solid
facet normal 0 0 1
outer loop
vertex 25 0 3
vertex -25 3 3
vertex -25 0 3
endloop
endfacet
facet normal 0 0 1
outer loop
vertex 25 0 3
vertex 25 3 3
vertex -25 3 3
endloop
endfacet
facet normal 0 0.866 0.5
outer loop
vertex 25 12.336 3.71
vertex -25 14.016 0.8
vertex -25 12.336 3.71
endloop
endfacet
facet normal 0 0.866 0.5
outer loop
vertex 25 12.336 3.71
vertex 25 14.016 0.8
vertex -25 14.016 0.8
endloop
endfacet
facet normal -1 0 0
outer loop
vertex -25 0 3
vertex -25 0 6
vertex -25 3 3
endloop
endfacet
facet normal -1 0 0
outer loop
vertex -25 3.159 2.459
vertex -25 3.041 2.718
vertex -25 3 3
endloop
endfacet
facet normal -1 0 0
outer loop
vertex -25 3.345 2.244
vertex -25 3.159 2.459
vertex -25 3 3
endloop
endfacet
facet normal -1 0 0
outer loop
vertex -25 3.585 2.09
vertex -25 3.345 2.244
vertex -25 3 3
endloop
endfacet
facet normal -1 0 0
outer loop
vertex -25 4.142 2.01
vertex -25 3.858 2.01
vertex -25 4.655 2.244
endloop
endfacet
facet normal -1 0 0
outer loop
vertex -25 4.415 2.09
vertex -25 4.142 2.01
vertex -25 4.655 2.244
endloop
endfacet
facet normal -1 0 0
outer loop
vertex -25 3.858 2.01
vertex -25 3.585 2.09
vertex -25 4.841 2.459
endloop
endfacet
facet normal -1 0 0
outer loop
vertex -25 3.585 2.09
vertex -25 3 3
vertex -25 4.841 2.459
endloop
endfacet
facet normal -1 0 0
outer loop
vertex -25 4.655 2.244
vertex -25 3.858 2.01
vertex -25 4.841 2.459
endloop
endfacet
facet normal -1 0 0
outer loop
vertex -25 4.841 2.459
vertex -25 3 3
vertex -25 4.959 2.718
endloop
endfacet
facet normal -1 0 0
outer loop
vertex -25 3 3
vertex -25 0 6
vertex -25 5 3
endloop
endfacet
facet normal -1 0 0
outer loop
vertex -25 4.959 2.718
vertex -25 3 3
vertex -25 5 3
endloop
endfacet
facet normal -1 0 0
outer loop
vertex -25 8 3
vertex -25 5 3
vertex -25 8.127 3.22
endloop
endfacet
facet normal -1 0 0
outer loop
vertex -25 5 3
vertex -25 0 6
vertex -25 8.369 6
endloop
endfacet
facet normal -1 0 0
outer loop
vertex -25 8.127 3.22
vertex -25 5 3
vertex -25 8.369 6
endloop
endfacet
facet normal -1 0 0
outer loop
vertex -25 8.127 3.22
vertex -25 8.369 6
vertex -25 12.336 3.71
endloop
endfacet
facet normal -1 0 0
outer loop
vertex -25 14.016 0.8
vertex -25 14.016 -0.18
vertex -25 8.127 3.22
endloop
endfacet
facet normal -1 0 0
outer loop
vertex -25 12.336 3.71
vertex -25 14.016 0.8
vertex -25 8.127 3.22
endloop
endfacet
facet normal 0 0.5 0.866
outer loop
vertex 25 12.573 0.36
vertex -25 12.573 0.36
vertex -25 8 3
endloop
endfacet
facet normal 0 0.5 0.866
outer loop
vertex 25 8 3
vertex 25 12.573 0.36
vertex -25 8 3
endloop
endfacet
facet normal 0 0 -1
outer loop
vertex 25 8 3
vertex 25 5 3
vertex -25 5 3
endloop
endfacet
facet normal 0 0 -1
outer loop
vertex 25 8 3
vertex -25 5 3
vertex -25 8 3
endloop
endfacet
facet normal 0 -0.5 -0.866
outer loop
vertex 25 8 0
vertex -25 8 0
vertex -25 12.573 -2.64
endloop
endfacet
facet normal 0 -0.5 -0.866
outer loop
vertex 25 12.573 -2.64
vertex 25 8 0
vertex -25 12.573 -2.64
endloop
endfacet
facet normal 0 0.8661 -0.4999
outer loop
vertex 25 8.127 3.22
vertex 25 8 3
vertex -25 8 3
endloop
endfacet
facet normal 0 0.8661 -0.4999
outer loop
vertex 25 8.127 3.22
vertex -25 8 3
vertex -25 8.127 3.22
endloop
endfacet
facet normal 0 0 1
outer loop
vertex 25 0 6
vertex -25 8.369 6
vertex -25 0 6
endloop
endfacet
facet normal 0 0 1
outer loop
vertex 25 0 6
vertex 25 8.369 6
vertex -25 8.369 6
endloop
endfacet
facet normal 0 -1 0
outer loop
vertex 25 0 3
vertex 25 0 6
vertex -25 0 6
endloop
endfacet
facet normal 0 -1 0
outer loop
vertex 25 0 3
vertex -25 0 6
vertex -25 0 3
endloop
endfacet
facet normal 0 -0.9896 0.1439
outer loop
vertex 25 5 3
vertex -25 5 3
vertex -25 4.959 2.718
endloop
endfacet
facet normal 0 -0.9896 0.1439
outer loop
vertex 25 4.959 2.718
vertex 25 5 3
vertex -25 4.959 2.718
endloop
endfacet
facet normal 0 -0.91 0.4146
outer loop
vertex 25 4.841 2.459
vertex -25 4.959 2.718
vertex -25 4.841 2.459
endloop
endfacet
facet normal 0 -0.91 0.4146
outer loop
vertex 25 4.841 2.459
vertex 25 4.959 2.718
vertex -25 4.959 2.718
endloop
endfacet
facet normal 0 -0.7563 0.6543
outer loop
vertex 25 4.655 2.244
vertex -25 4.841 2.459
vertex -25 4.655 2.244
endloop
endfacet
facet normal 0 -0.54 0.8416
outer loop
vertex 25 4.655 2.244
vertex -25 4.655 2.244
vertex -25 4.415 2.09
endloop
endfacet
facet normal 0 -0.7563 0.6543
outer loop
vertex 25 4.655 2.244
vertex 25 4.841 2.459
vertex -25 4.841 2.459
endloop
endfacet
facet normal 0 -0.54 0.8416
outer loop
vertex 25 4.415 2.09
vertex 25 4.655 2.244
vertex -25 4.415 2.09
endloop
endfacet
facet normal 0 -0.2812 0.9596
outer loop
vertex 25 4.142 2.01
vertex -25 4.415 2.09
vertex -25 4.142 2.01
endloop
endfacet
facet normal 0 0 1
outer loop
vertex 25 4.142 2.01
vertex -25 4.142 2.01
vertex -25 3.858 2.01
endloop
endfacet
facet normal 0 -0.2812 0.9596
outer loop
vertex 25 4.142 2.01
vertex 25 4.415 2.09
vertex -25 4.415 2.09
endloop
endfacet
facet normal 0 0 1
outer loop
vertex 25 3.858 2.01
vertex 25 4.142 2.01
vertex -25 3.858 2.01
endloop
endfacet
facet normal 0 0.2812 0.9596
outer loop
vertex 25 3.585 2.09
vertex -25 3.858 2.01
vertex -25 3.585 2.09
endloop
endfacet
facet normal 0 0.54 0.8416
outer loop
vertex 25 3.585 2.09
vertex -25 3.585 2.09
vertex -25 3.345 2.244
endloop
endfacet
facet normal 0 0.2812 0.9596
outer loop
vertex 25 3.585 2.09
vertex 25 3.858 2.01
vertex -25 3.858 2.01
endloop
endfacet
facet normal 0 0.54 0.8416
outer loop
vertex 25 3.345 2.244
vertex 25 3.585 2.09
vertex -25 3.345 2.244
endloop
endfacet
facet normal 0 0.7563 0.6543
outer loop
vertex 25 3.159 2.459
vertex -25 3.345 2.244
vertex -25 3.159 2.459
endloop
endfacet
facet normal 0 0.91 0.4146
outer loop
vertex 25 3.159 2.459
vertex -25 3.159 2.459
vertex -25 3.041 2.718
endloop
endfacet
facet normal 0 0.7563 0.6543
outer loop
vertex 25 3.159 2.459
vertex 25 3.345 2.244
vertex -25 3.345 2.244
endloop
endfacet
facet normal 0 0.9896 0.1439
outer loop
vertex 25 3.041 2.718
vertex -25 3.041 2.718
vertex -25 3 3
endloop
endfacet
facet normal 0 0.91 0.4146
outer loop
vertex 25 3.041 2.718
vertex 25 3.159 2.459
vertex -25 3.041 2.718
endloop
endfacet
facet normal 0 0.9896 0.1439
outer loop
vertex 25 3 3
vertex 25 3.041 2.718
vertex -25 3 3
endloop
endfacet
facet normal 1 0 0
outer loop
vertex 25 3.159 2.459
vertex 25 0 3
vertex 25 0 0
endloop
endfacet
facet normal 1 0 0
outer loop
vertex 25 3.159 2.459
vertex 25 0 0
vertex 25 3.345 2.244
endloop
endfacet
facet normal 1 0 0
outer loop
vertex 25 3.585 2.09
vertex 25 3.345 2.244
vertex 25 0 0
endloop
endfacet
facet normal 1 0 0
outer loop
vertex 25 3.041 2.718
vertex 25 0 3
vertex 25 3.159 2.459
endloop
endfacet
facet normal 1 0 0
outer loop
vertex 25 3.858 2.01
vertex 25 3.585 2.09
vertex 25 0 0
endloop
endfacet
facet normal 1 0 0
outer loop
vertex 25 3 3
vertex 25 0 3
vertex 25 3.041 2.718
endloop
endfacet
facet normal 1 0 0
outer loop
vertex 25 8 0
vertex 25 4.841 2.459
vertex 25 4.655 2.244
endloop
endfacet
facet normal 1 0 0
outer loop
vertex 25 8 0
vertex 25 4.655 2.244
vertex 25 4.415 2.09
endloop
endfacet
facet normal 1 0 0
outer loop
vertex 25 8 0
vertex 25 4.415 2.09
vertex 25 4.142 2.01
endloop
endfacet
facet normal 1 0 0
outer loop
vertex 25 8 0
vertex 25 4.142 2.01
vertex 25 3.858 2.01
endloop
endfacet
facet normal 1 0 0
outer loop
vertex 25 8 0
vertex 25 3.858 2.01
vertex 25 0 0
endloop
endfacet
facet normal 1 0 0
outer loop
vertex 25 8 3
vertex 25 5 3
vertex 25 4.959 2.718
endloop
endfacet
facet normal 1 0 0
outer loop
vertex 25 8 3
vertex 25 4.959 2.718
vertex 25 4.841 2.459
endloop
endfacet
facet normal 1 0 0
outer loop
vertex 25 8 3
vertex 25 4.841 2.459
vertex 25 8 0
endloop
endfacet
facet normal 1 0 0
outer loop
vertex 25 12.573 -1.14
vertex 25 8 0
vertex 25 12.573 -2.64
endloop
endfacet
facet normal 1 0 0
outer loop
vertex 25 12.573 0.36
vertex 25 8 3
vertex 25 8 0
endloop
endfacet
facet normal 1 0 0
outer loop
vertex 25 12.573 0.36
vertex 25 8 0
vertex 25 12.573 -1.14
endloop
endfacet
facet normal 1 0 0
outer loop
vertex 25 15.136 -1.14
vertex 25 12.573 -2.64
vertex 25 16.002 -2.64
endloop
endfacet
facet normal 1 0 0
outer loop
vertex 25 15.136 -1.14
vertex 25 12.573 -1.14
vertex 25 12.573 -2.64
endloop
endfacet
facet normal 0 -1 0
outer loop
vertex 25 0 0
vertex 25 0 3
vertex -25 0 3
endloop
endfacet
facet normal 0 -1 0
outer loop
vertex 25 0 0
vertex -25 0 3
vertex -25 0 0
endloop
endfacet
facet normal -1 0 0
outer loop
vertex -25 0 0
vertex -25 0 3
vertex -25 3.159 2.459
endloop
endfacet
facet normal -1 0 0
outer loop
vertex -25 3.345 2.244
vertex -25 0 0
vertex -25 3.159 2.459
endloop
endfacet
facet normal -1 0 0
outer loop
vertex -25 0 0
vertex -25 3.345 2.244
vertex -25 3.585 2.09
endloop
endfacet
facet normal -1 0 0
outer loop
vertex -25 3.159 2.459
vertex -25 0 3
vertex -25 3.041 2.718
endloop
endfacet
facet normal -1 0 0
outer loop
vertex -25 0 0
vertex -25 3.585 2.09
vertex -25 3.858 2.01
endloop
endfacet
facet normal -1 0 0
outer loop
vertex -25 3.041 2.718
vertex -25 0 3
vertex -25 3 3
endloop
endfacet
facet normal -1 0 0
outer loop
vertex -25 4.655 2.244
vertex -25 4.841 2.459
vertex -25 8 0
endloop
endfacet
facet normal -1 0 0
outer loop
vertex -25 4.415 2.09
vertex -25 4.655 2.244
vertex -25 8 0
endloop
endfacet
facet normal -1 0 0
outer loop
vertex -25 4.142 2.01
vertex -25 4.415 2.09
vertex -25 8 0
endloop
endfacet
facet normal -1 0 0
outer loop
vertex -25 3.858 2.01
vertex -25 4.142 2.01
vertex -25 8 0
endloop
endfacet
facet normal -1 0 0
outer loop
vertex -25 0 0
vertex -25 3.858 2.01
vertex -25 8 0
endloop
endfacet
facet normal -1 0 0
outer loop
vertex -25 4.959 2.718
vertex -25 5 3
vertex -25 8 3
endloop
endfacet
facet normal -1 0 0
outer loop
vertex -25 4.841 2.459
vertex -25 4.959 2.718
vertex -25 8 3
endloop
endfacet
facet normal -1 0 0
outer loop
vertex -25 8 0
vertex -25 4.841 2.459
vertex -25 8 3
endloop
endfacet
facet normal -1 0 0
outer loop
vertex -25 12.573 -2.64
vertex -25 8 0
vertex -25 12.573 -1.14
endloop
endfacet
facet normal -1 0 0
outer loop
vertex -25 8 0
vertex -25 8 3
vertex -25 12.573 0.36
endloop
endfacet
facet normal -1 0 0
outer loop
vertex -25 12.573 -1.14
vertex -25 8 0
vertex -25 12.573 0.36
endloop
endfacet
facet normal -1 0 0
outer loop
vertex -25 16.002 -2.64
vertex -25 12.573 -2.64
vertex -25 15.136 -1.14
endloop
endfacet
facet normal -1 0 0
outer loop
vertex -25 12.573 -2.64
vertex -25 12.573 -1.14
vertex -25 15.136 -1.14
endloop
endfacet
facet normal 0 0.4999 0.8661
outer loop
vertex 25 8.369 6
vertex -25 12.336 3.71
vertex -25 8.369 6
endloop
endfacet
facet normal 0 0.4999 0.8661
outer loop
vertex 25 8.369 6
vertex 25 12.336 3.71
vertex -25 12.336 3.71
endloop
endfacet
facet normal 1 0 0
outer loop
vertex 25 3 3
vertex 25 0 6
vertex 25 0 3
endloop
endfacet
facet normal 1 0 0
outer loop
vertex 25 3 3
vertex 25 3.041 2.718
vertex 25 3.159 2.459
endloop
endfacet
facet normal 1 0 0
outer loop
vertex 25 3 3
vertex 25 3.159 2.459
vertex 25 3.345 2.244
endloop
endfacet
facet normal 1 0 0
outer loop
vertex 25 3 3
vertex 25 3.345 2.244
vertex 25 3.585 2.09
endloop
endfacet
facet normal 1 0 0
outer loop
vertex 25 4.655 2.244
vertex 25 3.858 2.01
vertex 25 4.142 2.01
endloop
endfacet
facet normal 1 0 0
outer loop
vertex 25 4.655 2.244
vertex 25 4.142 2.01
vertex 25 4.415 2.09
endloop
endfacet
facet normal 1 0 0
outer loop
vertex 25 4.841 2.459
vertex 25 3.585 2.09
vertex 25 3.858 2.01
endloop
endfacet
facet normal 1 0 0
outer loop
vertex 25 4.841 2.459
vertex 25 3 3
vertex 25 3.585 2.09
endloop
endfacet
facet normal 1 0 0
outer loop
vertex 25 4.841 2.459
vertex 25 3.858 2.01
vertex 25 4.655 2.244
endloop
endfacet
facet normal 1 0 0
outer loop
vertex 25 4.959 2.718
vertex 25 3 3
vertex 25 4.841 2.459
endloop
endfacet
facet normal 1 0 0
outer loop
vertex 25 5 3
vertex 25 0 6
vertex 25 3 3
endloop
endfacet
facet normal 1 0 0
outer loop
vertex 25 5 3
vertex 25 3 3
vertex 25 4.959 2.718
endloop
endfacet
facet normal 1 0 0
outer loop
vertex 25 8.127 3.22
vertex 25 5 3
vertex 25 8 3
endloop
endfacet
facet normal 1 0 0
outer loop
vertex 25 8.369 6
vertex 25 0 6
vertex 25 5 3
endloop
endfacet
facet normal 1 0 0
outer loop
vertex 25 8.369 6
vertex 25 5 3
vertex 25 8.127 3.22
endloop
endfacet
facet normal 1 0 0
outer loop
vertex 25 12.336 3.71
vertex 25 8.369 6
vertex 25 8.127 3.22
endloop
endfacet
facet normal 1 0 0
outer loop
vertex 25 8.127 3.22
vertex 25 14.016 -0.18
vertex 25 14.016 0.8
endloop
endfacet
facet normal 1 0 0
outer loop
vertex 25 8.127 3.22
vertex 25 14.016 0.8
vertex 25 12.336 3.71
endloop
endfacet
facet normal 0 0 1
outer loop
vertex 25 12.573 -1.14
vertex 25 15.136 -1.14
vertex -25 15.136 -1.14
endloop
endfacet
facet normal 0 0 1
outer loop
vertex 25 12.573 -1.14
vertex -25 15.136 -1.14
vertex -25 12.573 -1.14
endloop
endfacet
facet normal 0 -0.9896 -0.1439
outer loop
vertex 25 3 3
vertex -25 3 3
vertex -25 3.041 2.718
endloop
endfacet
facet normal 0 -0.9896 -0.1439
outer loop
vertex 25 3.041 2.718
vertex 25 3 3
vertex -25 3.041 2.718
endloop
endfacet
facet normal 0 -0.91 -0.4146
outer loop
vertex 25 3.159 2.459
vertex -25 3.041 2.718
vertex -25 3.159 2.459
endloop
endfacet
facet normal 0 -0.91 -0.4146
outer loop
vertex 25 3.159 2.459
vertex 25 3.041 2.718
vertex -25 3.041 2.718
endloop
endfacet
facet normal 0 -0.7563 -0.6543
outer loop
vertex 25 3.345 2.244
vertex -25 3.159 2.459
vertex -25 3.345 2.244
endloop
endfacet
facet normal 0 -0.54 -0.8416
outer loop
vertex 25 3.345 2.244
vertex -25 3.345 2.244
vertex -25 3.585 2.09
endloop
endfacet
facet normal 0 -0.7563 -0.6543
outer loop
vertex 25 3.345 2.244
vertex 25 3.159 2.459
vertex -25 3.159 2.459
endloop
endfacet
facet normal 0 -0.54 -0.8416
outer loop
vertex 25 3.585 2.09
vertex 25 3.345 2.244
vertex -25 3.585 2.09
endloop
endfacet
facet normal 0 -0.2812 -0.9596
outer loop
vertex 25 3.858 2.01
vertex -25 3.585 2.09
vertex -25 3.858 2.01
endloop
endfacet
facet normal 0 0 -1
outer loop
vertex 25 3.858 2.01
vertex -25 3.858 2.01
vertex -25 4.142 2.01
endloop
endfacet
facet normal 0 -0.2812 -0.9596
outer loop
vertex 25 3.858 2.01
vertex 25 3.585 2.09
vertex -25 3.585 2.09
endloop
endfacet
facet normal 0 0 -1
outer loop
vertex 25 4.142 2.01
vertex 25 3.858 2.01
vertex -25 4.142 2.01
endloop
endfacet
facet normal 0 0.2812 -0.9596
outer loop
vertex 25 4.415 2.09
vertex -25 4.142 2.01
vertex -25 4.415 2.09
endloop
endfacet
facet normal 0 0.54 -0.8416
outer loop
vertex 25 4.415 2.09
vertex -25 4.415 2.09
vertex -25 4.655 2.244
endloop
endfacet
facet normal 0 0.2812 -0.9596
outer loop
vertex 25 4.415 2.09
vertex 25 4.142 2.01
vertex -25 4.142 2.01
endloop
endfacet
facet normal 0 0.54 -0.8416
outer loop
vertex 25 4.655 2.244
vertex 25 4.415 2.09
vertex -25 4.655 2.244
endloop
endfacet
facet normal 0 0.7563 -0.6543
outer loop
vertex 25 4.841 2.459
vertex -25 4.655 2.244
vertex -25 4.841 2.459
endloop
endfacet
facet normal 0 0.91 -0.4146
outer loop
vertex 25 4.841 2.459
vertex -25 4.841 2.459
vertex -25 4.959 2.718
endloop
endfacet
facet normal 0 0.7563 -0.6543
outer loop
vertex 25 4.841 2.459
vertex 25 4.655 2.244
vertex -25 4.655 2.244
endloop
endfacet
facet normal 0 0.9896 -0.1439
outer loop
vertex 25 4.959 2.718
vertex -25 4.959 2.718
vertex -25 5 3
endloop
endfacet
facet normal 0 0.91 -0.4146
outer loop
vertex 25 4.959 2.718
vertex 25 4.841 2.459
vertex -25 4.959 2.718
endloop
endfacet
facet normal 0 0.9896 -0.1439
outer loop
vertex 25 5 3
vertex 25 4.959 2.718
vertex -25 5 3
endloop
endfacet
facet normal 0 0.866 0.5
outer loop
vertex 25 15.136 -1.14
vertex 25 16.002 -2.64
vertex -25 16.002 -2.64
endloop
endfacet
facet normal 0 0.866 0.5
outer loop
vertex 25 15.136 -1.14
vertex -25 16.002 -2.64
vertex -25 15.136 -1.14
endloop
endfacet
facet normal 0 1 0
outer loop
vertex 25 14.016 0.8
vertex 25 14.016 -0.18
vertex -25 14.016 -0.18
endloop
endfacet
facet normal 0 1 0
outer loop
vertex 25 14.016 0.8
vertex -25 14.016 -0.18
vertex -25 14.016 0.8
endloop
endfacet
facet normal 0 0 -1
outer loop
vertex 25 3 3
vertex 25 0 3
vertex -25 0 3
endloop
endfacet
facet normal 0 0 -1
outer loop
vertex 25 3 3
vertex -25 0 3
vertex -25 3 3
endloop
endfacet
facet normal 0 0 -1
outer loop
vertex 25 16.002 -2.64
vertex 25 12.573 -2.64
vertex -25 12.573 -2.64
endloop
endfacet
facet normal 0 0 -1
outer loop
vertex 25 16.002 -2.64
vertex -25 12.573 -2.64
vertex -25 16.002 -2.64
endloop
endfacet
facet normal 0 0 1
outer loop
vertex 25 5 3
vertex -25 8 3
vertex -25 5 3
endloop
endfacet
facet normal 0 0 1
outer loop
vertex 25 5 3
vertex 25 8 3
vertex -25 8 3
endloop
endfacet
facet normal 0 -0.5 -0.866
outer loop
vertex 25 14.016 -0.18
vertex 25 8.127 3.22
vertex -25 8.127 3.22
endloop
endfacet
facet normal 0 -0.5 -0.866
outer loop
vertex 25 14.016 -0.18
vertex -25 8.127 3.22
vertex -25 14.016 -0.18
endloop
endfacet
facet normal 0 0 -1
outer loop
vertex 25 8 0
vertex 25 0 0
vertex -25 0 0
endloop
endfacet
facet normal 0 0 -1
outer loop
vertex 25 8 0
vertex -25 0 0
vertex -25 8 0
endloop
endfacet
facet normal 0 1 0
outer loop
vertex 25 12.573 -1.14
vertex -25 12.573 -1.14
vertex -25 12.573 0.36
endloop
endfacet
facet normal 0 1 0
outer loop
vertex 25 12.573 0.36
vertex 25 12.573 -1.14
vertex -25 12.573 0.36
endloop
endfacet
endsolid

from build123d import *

# Parameters (mm, degrees)
F1_DEPTH = 25
F2_DEPTH = 25


with BuildPart() as f1:
    # F0 (on Right) → F1 (new body, symmetric)
    with BuildSketch(Plane.YZ):
        with BuildLine():
            Line((8.36947, 6), (0, 6))
            Line((0, 6), (0, 3))
            Line((0, 3), (3, 3))
            ThreePointArc((3, 3), (4, 2), (5, 3))
            Line((5, 3), (8, 3))
            Line((8, 3), (8.127, 3.21997))
            Line((8.127, 3.21997), (14.015973, -0.18003))
            Line((14.015973, -0.18003), (14.015973, 0.8))
            Line((14.015973, 0.8), (12.335892, 3.709985))
            Line((12.335892, 3.709985), (8.36947, 6))
        make_face()
    extrude(amount=F1_DEPTH, both=True)


with BuildPart() as f2:
    # F0 (on Right) → F2 (new body, symmetric)
    with BuildSketch(Plane.YZ):
        with BuildLine():
            Line((3, 3), (0, 3))
            Line((0, 3), (0, 0))
            Line((0, 0), (8, 0))
            Line((8, 0), (12.57264, -2.640015))
            Line((12.57264, -2.640015), (16.002066, -2.640015))
            Line((16.002066, -2.640015), (15.136041, -1.140015))
            Line((15.136041, -1.140015), (12.57264, -1.140015))
            Line((12.57264, -1.140015), (12.57264, 0.359985))
            Line((12.57264, 0.359985), (8, 3))
            Line((8, 3), (5, 3))
            ThreePointArc((5, 3), (4, 2), (3, 3))
        make_face()
    extrude(amount=F2_DEPTH, both=True)


solid = Compound([f1.part, f2.part])
